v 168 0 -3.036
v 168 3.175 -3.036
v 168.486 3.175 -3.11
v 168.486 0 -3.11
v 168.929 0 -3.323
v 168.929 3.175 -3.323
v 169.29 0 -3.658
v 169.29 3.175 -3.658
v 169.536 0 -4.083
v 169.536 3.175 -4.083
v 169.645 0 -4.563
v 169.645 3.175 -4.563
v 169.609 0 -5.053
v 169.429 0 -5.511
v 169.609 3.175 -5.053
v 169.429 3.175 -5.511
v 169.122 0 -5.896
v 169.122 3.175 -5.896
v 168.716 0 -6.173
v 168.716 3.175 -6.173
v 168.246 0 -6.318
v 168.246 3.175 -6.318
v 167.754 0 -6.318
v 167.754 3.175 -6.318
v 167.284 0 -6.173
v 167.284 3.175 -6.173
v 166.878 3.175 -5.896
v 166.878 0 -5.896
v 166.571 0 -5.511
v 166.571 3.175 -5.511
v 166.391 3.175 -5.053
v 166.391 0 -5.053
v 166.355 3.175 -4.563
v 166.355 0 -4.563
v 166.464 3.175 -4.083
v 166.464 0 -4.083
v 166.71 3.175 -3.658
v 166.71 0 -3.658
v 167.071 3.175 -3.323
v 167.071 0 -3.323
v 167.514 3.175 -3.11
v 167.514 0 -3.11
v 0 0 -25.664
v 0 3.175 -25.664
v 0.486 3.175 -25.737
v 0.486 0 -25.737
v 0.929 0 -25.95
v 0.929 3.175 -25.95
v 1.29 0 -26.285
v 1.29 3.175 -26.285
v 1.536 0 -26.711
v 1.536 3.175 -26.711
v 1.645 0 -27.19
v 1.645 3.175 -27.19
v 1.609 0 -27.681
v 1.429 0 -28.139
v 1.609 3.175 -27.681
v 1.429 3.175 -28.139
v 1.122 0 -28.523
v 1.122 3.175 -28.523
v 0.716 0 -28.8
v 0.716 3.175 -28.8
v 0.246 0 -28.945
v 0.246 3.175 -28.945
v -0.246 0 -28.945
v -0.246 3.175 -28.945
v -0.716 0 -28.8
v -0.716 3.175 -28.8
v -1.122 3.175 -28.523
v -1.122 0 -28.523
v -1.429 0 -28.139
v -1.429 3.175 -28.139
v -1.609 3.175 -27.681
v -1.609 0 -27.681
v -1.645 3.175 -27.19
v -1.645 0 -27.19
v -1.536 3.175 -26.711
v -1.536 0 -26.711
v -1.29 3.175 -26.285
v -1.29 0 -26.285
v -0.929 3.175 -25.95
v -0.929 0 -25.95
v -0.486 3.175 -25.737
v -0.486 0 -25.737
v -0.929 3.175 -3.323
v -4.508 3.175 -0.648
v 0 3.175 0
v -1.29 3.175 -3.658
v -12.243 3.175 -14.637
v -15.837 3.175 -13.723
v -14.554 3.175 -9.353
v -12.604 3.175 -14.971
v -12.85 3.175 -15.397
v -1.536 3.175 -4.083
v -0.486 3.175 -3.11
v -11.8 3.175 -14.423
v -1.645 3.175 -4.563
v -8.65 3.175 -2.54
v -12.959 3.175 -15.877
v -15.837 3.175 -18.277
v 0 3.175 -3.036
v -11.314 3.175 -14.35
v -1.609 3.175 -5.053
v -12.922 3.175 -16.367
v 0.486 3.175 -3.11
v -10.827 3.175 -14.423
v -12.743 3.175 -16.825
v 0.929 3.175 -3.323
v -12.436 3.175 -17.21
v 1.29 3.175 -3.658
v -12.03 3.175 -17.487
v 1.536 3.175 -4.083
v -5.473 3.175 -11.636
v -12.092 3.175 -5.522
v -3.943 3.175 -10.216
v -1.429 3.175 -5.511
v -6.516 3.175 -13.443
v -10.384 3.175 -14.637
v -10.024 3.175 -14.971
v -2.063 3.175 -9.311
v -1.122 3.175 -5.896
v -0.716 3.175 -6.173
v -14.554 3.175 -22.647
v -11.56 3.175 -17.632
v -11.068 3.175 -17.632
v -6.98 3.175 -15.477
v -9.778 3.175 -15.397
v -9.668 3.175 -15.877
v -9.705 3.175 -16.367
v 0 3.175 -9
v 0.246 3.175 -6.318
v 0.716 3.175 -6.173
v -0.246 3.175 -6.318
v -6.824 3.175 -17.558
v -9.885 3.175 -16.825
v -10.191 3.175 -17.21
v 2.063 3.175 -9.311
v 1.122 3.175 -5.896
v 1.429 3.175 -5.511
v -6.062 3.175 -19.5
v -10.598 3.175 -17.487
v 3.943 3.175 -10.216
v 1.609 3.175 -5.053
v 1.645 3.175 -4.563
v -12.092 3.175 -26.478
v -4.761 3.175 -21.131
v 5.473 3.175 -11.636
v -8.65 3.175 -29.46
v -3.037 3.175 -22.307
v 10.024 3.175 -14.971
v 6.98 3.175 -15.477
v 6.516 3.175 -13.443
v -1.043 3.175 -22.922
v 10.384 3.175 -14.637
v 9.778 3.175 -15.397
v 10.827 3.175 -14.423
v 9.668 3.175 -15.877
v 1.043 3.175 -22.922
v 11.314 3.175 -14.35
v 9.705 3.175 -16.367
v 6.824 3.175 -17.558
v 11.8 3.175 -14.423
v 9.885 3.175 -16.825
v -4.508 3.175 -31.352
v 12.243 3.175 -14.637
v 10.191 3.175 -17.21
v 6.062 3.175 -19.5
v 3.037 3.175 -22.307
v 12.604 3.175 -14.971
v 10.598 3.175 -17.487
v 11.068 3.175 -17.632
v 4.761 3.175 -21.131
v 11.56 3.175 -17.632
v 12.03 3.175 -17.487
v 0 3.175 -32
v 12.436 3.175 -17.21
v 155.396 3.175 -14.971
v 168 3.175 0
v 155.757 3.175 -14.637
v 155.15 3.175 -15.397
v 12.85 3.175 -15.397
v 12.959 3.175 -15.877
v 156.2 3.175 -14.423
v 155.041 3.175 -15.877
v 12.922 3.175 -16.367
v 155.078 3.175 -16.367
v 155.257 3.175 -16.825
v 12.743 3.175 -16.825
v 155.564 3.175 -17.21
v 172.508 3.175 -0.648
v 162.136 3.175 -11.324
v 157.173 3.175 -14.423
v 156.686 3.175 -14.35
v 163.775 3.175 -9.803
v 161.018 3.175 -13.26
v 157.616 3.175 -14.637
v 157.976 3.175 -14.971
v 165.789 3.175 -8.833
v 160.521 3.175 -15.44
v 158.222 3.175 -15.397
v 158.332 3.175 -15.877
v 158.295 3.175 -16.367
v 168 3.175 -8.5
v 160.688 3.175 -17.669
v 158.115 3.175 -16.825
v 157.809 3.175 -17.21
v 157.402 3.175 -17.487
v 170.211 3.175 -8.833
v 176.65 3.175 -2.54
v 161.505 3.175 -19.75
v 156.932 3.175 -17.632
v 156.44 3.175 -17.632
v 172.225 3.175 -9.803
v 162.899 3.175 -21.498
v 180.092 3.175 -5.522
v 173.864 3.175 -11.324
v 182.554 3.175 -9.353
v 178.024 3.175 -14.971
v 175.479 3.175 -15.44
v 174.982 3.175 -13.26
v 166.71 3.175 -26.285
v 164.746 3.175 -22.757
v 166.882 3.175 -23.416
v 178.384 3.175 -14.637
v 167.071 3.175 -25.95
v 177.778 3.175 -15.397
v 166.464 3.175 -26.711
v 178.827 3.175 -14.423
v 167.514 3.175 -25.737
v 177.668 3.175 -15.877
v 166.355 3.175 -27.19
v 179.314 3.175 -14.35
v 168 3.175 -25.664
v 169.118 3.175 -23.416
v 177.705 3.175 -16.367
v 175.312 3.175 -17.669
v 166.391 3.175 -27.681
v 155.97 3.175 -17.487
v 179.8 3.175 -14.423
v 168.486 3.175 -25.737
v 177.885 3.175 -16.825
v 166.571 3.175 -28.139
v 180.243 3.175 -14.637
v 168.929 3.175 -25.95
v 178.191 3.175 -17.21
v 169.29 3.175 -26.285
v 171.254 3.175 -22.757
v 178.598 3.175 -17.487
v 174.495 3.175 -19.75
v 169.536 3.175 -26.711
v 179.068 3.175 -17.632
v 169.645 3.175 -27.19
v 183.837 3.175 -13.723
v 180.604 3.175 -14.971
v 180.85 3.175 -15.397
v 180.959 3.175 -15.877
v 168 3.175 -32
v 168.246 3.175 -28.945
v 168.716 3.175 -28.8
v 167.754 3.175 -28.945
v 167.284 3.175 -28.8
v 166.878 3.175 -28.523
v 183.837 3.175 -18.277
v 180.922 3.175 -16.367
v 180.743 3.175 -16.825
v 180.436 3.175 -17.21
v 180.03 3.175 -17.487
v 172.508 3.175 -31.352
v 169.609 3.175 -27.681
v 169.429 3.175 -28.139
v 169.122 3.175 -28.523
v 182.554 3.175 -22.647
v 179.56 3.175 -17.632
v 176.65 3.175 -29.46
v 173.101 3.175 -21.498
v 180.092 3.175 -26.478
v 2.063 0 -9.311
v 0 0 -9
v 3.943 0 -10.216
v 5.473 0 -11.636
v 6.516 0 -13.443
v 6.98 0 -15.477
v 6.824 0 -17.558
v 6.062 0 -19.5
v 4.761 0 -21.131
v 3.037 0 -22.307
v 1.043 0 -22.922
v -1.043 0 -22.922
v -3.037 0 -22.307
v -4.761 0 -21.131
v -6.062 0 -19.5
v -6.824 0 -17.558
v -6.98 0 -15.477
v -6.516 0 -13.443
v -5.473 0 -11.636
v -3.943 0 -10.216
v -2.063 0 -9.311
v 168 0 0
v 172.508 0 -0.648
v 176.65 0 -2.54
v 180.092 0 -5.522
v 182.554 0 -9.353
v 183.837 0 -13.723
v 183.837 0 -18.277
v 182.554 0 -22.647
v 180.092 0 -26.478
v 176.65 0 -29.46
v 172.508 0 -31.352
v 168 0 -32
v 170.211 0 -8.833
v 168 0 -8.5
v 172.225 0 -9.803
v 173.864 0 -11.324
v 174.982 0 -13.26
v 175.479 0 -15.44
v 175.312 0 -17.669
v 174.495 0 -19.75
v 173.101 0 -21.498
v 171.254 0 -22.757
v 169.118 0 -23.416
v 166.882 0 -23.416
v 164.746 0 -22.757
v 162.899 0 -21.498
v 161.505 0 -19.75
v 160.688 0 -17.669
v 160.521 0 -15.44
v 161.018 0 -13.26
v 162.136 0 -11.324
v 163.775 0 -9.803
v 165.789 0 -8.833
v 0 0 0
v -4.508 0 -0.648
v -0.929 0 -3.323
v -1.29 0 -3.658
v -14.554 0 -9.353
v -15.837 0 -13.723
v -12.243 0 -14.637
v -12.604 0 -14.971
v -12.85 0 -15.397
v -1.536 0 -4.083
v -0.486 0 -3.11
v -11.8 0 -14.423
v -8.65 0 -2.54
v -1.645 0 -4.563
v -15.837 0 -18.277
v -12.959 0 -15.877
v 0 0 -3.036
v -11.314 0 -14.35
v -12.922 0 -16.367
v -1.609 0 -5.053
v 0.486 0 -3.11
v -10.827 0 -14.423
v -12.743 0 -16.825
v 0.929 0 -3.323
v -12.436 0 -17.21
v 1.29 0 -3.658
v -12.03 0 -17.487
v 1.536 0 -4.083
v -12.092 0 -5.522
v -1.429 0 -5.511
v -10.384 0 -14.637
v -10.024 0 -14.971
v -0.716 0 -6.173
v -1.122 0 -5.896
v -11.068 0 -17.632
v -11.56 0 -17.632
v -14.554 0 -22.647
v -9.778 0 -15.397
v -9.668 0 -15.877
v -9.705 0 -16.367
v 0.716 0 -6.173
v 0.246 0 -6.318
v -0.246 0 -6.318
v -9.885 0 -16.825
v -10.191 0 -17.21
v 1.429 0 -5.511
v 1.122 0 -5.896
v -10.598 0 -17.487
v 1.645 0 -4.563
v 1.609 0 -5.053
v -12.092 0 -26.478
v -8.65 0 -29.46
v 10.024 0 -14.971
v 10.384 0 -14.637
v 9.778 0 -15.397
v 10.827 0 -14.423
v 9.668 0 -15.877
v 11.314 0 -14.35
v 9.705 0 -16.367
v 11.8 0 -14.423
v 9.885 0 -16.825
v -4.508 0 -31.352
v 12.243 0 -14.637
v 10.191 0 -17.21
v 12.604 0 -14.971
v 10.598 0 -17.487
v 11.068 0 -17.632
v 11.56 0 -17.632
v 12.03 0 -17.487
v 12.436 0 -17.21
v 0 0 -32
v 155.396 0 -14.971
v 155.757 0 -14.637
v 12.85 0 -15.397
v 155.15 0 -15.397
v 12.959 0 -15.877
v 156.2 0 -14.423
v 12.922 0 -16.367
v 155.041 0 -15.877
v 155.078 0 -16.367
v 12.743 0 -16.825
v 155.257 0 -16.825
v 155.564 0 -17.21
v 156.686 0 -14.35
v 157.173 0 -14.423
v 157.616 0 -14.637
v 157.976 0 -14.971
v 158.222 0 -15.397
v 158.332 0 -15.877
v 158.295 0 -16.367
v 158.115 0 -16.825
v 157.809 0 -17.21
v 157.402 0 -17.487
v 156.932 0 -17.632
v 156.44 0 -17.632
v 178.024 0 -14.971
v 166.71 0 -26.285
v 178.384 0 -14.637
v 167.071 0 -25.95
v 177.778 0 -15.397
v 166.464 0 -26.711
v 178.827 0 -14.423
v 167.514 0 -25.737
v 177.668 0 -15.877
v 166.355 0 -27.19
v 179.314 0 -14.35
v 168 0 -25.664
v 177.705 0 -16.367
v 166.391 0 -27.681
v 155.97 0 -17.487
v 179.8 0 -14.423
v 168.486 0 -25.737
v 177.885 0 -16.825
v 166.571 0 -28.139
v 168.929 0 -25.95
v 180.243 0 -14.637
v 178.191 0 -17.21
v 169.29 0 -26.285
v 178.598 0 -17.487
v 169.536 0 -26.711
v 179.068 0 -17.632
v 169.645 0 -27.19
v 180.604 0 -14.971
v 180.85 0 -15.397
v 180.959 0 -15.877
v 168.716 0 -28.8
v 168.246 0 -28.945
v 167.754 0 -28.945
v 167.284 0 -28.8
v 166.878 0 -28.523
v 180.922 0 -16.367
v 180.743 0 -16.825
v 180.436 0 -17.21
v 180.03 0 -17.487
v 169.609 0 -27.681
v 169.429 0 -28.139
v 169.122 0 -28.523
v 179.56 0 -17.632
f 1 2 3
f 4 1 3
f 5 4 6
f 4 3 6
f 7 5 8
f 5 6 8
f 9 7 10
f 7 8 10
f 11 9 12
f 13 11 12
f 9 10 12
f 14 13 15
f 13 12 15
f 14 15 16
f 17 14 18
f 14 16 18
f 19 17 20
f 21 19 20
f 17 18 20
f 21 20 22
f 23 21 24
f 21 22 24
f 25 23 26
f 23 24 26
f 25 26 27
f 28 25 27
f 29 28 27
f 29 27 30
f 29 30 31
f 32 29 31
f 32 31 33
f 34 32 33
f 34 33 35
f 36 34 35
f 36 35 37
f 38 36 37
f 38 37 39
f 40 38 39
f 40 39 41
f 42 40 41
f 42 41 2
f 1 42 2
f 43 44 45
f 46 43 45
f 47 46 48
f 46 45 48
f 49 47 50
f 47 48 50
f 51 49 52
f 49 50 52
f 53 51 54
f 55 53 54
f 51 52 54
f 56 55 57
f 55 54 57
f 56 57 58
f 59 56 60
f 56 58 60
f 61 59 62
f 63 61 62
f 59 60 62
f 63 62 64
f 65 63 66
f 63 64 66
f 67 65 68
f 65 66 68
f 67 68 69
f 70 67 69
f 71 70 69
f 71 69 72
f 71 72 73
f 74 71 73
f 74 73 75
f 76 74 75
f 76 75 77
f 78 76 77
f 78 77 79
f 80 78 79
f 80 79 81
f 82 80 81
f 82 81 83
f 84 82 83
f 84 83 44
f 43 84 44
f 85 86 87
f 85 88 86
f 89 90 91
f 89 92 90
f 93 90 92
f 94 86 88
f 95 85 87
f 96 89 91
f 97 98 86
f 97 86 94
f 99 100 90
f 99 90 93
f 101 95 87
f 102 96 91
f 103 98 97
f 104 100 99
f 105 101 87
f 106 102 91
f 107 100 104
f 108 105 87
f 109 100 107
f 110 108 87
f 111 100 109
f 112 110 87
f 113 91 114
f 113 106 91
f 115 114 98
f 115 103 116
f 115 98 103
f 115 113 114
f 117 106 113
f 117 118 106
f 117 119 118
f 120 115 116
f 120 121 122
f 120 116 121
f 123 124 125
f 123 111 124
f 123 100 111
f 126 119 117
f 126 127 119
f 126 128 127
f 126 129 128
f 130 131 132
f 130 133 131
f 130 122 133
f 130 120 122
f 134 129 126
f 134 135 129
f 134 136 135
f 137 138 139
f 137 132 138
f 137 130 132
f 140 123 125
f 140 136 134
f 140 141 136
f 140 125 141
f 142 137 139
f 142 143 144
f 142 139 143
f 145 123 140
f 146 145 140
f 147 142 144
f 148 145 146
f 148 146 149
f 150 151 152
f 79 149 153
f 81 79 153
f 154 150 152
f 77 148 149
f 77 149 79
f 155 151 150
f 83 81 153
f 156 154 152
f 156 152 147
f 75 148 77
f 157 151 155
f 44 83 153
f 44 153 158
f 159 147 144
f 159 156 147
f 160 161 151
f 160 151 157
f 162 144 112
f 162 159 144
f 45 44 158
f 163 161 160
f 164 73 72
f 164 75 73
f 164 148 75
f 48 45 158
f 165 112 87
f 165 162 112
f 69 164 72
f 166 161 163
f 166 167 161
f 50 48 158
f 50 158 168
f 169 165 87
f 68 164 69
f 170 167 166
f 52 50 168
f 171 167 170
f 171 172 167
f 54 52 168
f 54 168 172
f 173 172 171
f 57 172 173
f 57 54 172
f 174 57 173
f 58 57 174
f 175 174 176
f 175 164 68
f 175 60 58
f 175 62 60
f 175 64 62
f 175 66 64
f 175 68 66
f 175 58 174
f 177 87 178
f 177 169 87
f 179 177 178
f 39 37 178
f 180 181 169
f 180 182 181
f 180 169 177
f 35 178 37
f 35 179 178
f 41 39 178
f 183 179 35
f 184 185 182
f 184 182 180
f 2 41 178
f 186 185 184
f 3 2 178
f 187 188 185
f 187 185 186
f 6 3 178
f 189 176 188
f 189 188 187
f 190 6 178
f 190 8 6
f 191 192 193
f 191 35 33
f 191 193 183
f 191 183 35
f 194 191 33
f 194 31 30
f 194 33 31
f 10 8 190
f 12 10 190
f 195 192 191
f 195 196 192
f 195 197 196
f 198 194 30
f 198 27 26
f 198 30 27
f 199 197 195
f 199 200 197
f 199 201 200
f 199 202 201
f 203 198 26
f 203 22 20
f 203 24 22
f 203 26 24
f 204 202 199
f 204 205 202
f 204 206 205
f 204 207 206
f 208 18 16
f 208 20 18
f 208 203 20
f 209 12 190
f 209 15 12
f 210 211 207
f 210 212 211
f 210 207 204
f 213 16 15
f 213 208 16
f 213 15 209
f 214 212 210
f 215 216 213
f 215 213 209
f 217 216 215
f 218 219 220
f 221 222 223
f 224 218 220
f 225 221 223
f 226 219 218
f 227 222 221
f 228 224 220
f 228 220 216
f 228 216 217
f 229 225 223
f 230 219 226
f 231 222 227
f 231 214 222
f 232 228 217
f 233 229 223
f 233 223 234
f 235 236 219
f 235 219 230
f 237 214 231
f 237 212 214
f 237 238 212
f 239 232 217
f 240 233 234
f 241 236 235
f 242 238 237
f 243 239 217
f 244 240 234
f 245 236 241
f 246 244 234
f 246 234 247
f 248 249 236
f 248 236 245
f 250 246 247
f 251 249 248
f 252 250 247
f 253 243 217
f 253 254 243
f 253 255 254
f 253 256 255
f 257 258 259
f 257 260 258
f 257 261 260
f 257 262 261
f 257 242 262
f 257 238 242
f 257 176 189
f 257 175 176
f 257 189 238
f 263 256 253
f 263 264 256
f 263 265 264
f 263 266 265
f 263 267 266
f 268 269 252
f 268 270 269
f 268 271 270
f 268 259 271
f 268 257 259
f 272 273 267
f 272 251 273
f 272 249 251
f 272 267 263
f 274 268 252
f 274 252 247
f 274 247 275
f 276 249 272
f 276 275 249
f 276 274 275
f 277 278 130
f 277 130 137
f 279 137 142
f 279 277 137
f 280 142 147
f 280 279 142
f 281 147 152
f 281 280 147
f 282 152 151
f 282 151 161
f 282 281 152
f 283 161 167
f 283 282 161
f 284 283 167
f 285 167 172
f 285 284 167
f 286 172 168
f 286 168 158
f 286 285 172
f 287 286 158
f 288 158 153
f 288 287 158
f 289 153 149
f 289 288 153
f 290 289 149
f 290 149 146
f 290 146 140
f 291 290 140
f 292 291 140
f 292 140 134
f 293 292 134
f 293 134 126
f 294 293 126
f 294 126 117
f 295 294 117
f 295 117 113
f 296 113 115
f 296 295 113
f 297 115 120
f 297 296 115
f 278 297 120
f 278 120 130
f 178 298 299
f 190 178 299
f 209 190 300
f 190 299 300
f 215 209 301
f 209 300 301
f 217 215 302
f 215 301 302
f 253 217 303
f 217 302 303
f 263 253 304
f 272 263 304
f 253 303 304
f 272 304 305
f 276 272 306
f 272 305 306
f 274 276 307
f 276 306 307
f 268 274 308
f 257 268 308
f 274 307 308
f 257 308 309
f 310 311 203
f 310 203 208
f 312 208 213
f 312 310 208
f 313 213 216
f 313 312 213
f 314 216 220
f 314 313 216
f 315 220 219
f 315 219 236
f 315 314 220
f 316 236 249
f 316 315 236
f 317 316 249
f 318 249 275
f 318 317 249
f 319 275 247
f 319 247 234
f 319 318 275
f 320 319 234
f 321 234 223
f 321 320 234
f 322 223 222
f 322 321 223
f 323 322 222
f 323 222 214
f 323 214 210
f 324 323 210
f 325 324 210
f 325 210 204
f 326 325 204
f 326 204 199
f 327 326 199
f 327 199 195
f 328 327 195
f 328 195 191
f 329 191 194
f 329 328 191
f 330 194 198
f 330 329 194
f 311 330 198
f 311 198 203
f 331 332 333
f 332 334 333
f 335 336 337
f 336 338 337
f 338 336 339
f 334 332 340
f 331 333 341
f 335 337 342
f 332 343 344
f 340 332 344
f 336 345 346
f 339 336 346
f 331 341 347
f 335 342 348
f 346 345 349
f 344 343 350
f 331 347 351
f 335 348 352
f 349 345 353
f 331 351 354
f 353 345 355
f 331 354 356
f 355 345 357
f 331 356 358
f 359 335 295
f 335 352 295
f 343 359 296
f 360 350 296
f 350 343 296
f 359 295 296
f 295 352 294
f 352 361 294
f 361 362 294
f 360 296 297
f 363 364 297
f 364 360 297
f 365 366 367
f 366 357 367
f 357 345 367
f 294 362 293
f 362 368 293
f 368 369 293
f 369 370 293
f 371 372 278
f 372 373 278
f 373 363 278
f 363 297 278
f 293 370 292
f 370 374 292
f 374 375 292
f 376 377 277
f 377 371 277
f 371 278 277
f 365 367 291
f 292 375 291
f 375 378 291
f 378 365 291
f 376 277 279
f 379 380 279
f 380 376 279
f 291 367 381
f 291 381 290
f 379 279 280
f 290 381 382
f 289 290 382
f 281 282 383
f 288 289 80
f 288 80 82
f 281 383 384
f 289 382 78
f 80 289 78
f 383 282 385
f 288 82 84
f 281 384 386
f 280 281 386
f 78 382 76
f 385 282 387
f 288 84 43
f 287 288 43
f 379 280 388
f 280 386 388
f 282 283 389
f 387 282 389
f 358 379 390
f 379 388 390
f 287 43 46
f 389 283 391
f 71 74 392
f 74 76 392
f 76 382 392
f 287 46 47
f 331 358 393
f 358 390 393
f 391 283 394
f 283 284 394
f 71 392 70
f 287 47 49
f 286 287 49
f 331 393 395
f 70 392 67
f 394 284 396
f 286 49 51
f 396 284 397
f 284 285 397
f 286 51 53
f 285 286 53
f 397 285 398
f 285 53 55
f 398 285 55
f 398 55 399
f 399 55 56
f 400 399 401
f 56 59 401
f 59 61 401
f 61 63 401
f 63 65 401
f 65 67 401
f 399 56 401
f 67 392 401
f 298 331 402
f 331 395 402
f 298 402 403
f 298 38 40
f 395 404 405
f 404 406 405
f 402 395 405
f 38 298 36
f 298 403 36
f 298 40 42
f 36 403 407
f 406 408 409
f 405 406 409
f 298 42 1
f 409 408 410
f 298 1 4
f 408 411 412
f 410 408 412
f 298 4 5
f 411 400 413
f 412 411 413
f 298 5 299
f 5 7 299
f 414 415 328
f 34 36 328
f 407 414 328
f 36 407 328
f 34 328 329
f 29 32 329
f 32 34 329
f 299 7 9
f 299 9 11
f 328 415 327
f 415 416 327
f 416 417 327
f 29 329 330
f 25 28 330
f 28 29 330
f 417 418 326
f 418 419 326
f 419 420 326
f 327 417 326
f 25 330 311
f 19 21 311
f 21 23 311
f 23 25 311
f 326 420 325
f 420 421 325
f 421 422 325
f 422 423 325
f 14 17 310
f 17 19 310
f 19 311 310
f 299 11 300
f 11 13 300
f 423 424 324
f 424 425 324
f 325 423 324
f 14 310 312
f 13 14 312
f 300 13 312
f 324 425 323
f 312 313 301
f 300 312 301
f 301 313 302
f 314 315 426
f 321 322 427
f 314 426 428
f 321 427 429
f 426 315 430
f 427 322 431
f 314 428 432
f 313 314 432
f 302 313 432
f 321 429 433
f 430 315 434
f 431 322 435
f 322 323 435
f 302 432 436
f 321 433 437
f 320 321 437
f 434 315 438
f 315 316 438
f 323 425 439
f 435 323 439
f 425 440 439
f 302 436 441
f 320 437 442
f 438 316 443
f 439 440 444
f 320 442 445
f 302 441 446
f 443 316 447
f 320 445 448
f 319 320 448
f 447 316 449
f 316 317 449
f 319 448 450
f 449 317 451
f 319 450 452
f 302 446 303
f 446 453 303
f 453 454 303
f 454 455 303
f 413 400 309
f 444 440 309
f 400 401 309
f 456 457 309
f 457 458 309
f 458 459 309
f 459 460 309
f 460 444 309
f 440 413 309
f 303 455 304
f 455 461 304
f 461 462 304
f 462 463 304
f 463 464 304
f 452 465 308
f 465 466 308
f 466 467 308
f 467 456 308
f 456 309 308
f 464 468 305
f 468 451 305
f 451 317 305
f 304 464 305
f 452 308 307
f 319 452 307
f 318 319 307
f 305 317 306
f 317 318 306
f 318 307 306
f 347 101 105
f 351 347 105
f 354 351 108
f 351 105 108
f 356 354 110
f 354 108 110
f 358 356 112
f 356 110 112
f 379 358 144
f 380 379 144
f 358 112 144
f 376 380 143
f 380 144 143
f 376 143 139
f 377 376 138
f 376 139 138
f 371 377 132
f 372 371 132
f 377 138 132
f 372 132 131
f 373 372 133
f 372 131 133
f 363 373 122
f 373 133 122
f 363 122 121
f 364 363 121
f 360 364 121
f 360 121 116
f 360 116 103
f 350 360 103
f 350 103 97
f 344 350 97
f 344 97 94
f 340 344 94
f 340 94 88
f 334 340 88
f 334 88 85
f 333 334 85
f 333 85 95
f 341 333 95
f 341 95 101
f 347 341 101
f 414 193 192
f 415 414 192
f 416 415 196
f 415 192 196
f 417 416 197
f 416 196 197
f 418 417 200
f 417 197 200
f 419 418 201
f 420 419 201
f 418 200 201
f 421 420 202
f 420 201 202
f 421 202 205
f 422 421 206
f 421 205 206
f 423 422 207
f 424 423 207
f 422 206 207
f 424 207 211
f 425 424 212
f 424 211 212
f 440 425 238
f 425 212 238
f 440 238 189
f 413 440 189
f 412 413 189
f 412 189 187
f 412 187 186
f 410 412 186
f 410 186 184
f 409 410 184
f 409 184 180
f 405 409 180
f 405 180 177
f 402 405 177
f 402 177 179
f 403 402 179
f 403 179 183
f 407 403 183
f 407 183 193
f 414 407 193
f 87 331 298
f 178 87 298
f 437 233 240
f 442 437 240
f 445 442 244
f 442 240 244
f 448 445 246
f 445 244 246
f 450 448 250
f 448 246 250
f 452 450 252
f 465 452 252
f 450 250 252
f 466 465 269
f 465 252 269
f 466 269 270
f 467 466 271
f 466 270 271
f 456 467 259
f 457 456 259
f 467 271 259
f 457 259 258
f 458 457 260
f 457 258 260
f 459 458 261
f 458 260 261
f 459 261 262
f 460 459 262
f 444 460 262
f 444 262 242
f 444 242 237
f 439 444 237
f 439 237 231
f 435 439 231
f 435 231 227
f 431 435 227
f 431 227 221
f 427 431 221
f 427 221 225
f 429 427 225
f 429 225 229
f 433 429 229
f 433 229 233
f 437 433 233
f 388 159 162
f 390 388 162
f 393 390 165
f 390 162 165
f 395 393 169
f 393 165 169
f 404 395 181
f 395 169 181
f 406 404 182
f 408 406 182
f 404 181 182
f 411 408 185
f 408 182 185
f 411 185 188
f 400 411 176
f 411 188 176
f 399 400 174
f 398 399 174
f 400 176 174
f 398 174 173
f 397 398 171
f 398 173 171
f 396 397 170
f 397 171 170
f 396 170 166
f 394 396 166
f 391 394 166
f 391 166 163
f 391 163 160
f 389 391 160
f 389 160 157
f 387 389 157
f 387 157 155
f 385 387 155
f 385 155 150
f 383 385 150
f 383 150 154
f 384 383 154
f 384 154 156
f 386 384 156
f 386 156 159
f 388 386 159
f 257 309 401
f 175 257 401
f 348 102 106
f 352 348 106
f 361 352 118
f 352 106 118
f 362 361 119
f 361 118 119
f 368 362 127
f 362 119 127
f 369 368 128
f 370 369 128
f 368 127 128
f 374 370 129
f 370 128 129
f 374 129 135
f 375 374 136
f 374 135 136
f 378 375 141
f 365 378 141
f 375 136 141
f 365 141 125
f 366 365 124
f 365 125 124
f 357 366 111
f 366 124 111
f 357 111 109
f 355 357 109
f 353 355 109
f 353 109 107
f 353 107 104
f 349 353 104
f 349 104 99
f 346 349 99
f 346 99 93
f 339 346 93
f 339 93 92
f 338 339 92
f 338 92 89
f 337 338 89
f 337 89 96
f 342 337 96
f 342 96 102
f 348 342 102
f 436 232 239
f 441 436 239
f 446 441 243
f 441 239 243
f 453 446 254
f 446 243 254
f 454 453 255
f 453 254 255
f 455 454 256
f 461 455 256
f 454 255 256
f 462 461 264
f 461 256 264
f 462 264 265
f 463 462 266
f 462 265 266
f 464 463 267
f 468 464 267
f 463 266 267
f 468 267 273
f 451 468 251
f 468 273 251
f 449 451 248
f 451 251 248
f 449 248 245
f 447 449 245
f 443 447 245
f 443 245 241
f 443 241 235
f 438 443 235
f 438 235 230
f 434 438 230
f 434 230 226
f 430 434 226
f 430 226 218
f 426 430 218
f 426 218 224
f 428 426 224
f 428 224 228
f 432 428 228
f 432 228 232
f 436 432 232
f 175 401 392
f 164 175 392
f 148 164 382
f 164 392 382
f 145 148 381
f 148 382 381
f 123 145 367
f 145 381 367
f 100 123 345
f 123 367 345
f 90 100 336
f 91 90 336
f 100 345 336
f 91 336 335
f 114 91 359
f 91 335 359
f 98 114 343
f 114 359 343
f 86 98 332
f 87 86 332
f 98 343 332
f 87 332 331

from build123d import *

# Parameters (mm, degrees)
SKETCH1_R           = 7
SKETCH1_R_2         = 7.5
BOSS_EXTRUDE1_DEPTH = 3.175
SKETCH2_R           = 1.65
CUT_EXTRUDE1_DEPTH  = 10


with BuildPart() as part:
    # Sketch1 → Boss-Extrude1 (new body)
    with BuildSketch(Plane(origin=(0, 0, 0), x_dir=(1, 0, 0), z_dir=(0, 1, 0))):
        with BuildLine():
            Line((0, 0), (168, 0))
            ThreePointArc((168, 0), (184, 16), (168, 32))
            Line((168, 32), (0, 32))
            ThreePointArc((0, 32), (-16, 16), (0, 0))
        make_face()
        with Locations(Location((0, 16, 0), (0, 0, 270))):
            Circle(SKETCH1_R, mode=Mode.SUBTRACT)
        with Locations(Location((168, 16, 0), (0, 0, 270))):
            Circle(SKETCH1_R_2, mode=Mode.SUBTRACT)
    extrude(amount=BOSS_EXTRUDE1_DEPTH)

    # Sketch2 → Cut-Extrude1 (cut)
    with BuildSketch(Plane(origin=(0, 3.175, 0), x_dir=(1, 0, 0), z_dir=(0, 1, 0))):
        with Locations(Location((156.686291501, 16, 0), (0, 0, 270))):
            Circle(SKETCH2_R)
        with Locations(Location((168, 27.313708499, 0), (0, 0, 270))):
            Circle(SKETCH2_R)
        with Locations(Location((-11.313708499, 16, 0), (0, 0, 270))):
            Circle(SKETCH2_R)
        with Locations(Location((0, 27.313708499, 0), (0, 0, 270))):
            Circle(SKETCH2_R)
        with Locations(Location((11.313708499, 16, 0), (0, 0, 270))):
            Circle(SKETCH2_R)
        with Locations(Location((0, 4.686291501, 0), (0, 0, 270))):
            Circle(SKETCH2_R)
        with Locations(Location((168, 4.686291501, 0), (0, 0, 270))):
            Circle(SKETCH2_R)
        with Locations(Location((179.313708499, 16, 0), (0, 0, 270))):
            Circle(SKETCH2_R)
    extrude(amount=-CUT_EXTRUDE1_DEPTH, mode=Mode.SUBTRACT)


solid = part.part
